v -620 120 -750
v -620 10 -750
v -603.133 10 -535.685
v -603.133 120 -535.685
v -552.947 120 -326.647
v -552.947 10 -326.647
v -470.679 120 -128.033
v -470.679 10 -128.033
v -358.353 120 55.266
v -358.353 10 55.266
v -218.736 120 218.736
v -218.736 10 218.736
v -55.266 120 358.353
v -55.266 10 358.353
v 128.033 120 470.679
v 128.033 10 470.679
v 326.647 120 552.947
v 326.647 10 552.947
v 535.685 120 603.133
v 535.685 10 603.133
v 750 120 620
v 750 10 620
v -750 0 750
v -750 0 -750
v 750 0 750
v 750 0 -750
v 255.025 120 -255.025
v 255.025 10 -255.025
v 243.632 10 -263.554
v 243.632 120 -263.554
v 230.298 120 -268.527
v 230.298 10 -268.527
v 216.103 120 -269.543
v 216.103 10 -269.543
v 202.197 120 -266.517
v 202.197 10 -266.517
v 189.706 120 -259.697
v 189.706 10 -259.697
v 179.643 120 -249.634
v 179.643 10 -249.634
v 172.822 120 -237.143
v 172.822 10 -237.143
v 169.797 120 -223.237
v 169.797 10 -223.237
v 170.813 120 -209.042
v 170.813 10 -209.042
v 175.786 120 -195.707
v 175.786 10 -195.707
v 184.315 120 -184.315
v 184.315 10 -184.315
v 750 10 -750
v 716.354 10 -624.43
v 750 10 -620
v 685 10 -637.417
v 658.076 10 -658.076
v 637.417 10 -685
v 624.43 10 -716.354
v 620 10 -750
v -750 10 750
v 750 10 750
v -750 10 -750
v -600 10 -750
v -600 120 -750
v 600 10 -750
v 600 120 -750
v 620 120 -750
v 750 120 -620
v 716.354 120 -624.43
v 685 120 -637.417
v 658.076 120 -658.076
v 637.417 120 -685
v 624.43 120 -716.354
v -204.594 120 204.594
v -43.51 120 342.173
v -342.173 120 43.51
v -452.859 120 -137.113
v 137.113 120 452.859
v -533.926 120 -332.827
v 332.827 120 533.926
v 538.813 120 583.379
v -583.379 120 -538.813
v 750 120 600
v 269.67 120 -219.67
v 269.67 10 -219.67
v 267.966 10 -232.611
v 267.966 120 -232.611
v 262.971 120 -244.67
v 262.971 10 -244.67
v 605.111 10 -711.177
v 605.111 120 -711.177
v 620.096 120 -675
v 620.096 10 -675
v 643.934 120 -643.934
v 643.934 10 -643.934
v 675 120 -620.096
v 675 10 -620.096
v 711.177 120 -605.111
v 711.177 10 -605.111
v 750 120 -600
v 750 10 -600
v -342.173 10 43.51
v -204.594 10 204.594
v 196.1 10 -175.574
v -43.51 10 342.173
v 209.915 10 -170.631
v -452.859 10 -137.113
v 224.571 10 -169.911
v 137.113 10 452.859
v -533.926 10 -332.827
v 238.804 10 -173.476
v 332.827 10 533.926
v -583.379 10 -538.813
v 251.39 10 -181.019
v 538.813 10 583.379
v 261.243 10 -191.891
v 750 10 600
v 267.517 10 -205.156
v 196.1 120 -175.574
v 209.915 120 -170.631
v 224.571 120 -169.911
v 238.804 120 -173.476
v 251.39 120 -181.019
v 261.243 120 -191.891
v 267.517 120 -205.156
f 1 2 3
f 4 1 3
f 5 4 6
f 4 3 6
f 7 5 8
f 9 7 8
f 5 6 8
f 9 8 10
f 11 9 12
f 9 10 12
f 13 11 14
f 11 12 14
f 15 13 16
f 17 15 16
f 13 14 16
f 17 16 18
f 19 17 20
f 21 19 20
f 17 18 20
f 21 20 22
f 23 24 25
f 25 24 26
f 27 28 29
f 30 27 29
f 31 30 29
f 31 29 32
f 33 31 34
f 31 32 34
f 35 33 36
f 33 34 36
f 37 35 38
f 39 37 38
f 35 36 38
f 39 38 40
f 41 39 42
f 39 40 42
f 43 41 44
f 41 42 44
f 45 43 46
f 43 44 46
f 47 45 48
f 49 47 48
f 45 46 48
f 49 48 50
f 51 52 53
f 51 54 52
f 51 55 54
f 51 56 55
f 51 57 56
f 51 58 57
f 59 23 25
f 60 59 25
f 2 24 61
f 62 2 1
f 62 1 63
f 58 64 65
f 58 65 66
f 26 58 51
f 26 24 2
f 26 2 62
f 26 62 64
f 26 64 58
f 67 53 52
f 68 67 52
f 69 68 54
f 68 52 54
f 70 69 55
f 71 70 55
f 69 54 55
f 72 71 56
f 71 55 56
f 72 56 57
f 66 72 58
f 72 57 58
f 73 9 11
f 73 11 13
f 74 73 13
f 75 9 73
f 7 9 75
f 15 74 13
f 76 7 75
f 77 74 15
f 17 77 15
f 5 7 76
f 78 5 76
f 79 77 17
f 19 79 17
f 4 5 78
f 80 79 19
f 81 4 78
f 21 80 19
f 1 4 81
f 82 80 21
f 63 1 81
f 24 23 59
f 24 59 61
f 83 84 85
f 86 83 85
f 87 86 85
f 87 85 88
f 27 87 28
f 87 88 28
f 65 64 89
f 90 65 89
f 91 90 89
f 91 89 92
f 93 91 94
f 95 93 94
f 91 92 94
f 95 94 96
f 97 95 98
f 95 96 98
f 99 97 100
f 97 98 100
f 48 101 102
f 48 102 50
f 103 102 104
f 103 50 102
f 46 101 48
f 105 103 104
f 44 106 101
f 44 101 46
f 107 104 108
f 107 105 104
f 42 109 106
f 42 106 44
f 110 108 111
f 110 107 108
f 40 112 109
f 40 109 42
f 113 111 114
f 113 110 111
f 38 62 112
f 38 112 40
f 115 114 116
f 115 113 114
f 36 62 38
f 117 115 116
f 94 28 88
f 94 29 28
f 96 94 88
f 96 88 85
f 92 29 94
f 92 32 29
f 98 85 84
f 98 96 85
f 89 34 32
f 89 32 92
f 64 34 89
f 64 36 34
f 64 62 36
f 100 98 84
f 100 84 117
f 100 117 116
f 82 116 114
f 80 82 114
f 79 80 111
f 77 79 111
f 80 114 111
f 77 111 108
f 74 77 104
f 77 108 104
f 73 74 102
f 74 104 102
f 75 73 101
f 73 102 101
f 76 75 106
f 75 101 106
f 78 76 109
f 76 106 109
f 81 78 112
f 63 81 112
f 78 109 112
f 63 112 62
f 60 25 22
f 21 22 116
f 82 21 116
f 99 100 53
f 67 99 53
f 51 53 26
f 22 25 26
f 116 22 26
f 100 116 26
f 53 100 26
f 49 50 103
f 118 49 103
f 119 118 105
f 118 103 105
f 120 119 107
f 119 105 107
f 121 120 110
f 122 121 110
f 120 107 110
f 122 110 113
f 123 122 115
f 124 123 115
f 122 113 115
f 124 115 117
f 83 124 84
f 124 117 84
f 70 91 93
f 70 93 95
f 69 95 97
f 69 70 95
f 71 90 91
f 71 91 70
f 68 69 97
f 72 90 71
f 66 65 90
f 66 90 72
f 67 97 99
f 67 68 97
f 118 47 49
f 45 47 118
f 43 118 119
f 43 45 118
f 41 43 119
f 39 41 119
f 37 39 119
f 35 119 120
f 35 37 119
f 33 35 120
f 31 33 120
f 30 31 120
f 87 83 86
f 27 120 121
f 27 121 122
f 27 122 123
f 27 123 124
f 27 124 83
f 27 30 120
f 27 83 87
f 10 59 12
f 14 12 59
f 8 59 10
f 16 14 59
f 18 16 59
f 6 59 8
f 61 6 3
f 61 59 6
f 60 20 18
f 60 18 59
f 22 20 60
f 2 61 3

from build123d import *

# Parameters (mm, degrees)
SKETCH2_W           = 1500
SKETCH2_H           = 1500
BOSS_EXTRUDE1_DEPTH = 10
BOSS_EXTRUDE2_DEPTH = 110
BOSS_EXTRUDE3_DEPTH = 110


with BuildPart() as part:
    # Sketch2 → Boss-Extrude1 (new body)
    with BuildSketch(Plane(origin=(0, 0, 0), x_dir=(1, 0, 0), z_dir=(0, 1, 0))):
        Rectangle(SKETCH2_W, SKETCH2_H)
    extrude(amount=BOSS_EXTRUDE1_DEPTH)

    # Sketch3 → Boss-Extrude2 (add)
    with BuildSketch(Plane(origin=(0, 10, 0), x_dir=(1, 0, 0), z_dir=(0, 1, 0))):
        with BuildLine():
            ThreePointArc((750, -600), (-204.594154602, -204.594154602), (-600, 750))
            Line((-600, 750), (-620, 750))
            ThreePointArc((-620, 750), (-218.736290226, -218.736290226), (750, -620))
            Line((750, -620), (750, -600))
        make_face()
        with BuildLine():
            Line((620, 750), (600, 750))
            ThreePointArc((600, 750), (643.933982822, 643.933982822), (750, 600))
            Line((750, 600), (750, 620))
            ThreePointArc((750, 620), (658.076118446, 658.076118446), (620, 750))
        make_face()
    extrude(amount=BOSS_EXTRUDE2_DEPTH)

    # Sketch4 → Boss-Extrude3 (add)
    with BuildSketch(Plane(origin=(0, 10, 0), x_dir=(1, 0, 0), z_dir=(0, 1, 0))):
        with BuildLine():
            ThreePointArc((269.66991411, 219.66991411), (265.863890736, 238.804085728), (255.025253169, 255.025253169))
            Line((255.025253169, 255.025253169), (184.314575051, 184.314575051))
            ThreePointArc((184.314575051, 184.314575051), (238.804085728, 173.475937485), (269.66991411, 219.66991411))
        make_face()
        with BuildLine():
            Line((184.314575051, 184.314575051), (255.025253169, 255.025253169))
            ThreePointArc((255.025253169, 255.025253169), (184.314575051, 255.025253169), (184.314575051, 184.314575051))
        make_face()
    extrude(amount=BOSS_EXTRUDE3_DEPTH)


solid = part.part
